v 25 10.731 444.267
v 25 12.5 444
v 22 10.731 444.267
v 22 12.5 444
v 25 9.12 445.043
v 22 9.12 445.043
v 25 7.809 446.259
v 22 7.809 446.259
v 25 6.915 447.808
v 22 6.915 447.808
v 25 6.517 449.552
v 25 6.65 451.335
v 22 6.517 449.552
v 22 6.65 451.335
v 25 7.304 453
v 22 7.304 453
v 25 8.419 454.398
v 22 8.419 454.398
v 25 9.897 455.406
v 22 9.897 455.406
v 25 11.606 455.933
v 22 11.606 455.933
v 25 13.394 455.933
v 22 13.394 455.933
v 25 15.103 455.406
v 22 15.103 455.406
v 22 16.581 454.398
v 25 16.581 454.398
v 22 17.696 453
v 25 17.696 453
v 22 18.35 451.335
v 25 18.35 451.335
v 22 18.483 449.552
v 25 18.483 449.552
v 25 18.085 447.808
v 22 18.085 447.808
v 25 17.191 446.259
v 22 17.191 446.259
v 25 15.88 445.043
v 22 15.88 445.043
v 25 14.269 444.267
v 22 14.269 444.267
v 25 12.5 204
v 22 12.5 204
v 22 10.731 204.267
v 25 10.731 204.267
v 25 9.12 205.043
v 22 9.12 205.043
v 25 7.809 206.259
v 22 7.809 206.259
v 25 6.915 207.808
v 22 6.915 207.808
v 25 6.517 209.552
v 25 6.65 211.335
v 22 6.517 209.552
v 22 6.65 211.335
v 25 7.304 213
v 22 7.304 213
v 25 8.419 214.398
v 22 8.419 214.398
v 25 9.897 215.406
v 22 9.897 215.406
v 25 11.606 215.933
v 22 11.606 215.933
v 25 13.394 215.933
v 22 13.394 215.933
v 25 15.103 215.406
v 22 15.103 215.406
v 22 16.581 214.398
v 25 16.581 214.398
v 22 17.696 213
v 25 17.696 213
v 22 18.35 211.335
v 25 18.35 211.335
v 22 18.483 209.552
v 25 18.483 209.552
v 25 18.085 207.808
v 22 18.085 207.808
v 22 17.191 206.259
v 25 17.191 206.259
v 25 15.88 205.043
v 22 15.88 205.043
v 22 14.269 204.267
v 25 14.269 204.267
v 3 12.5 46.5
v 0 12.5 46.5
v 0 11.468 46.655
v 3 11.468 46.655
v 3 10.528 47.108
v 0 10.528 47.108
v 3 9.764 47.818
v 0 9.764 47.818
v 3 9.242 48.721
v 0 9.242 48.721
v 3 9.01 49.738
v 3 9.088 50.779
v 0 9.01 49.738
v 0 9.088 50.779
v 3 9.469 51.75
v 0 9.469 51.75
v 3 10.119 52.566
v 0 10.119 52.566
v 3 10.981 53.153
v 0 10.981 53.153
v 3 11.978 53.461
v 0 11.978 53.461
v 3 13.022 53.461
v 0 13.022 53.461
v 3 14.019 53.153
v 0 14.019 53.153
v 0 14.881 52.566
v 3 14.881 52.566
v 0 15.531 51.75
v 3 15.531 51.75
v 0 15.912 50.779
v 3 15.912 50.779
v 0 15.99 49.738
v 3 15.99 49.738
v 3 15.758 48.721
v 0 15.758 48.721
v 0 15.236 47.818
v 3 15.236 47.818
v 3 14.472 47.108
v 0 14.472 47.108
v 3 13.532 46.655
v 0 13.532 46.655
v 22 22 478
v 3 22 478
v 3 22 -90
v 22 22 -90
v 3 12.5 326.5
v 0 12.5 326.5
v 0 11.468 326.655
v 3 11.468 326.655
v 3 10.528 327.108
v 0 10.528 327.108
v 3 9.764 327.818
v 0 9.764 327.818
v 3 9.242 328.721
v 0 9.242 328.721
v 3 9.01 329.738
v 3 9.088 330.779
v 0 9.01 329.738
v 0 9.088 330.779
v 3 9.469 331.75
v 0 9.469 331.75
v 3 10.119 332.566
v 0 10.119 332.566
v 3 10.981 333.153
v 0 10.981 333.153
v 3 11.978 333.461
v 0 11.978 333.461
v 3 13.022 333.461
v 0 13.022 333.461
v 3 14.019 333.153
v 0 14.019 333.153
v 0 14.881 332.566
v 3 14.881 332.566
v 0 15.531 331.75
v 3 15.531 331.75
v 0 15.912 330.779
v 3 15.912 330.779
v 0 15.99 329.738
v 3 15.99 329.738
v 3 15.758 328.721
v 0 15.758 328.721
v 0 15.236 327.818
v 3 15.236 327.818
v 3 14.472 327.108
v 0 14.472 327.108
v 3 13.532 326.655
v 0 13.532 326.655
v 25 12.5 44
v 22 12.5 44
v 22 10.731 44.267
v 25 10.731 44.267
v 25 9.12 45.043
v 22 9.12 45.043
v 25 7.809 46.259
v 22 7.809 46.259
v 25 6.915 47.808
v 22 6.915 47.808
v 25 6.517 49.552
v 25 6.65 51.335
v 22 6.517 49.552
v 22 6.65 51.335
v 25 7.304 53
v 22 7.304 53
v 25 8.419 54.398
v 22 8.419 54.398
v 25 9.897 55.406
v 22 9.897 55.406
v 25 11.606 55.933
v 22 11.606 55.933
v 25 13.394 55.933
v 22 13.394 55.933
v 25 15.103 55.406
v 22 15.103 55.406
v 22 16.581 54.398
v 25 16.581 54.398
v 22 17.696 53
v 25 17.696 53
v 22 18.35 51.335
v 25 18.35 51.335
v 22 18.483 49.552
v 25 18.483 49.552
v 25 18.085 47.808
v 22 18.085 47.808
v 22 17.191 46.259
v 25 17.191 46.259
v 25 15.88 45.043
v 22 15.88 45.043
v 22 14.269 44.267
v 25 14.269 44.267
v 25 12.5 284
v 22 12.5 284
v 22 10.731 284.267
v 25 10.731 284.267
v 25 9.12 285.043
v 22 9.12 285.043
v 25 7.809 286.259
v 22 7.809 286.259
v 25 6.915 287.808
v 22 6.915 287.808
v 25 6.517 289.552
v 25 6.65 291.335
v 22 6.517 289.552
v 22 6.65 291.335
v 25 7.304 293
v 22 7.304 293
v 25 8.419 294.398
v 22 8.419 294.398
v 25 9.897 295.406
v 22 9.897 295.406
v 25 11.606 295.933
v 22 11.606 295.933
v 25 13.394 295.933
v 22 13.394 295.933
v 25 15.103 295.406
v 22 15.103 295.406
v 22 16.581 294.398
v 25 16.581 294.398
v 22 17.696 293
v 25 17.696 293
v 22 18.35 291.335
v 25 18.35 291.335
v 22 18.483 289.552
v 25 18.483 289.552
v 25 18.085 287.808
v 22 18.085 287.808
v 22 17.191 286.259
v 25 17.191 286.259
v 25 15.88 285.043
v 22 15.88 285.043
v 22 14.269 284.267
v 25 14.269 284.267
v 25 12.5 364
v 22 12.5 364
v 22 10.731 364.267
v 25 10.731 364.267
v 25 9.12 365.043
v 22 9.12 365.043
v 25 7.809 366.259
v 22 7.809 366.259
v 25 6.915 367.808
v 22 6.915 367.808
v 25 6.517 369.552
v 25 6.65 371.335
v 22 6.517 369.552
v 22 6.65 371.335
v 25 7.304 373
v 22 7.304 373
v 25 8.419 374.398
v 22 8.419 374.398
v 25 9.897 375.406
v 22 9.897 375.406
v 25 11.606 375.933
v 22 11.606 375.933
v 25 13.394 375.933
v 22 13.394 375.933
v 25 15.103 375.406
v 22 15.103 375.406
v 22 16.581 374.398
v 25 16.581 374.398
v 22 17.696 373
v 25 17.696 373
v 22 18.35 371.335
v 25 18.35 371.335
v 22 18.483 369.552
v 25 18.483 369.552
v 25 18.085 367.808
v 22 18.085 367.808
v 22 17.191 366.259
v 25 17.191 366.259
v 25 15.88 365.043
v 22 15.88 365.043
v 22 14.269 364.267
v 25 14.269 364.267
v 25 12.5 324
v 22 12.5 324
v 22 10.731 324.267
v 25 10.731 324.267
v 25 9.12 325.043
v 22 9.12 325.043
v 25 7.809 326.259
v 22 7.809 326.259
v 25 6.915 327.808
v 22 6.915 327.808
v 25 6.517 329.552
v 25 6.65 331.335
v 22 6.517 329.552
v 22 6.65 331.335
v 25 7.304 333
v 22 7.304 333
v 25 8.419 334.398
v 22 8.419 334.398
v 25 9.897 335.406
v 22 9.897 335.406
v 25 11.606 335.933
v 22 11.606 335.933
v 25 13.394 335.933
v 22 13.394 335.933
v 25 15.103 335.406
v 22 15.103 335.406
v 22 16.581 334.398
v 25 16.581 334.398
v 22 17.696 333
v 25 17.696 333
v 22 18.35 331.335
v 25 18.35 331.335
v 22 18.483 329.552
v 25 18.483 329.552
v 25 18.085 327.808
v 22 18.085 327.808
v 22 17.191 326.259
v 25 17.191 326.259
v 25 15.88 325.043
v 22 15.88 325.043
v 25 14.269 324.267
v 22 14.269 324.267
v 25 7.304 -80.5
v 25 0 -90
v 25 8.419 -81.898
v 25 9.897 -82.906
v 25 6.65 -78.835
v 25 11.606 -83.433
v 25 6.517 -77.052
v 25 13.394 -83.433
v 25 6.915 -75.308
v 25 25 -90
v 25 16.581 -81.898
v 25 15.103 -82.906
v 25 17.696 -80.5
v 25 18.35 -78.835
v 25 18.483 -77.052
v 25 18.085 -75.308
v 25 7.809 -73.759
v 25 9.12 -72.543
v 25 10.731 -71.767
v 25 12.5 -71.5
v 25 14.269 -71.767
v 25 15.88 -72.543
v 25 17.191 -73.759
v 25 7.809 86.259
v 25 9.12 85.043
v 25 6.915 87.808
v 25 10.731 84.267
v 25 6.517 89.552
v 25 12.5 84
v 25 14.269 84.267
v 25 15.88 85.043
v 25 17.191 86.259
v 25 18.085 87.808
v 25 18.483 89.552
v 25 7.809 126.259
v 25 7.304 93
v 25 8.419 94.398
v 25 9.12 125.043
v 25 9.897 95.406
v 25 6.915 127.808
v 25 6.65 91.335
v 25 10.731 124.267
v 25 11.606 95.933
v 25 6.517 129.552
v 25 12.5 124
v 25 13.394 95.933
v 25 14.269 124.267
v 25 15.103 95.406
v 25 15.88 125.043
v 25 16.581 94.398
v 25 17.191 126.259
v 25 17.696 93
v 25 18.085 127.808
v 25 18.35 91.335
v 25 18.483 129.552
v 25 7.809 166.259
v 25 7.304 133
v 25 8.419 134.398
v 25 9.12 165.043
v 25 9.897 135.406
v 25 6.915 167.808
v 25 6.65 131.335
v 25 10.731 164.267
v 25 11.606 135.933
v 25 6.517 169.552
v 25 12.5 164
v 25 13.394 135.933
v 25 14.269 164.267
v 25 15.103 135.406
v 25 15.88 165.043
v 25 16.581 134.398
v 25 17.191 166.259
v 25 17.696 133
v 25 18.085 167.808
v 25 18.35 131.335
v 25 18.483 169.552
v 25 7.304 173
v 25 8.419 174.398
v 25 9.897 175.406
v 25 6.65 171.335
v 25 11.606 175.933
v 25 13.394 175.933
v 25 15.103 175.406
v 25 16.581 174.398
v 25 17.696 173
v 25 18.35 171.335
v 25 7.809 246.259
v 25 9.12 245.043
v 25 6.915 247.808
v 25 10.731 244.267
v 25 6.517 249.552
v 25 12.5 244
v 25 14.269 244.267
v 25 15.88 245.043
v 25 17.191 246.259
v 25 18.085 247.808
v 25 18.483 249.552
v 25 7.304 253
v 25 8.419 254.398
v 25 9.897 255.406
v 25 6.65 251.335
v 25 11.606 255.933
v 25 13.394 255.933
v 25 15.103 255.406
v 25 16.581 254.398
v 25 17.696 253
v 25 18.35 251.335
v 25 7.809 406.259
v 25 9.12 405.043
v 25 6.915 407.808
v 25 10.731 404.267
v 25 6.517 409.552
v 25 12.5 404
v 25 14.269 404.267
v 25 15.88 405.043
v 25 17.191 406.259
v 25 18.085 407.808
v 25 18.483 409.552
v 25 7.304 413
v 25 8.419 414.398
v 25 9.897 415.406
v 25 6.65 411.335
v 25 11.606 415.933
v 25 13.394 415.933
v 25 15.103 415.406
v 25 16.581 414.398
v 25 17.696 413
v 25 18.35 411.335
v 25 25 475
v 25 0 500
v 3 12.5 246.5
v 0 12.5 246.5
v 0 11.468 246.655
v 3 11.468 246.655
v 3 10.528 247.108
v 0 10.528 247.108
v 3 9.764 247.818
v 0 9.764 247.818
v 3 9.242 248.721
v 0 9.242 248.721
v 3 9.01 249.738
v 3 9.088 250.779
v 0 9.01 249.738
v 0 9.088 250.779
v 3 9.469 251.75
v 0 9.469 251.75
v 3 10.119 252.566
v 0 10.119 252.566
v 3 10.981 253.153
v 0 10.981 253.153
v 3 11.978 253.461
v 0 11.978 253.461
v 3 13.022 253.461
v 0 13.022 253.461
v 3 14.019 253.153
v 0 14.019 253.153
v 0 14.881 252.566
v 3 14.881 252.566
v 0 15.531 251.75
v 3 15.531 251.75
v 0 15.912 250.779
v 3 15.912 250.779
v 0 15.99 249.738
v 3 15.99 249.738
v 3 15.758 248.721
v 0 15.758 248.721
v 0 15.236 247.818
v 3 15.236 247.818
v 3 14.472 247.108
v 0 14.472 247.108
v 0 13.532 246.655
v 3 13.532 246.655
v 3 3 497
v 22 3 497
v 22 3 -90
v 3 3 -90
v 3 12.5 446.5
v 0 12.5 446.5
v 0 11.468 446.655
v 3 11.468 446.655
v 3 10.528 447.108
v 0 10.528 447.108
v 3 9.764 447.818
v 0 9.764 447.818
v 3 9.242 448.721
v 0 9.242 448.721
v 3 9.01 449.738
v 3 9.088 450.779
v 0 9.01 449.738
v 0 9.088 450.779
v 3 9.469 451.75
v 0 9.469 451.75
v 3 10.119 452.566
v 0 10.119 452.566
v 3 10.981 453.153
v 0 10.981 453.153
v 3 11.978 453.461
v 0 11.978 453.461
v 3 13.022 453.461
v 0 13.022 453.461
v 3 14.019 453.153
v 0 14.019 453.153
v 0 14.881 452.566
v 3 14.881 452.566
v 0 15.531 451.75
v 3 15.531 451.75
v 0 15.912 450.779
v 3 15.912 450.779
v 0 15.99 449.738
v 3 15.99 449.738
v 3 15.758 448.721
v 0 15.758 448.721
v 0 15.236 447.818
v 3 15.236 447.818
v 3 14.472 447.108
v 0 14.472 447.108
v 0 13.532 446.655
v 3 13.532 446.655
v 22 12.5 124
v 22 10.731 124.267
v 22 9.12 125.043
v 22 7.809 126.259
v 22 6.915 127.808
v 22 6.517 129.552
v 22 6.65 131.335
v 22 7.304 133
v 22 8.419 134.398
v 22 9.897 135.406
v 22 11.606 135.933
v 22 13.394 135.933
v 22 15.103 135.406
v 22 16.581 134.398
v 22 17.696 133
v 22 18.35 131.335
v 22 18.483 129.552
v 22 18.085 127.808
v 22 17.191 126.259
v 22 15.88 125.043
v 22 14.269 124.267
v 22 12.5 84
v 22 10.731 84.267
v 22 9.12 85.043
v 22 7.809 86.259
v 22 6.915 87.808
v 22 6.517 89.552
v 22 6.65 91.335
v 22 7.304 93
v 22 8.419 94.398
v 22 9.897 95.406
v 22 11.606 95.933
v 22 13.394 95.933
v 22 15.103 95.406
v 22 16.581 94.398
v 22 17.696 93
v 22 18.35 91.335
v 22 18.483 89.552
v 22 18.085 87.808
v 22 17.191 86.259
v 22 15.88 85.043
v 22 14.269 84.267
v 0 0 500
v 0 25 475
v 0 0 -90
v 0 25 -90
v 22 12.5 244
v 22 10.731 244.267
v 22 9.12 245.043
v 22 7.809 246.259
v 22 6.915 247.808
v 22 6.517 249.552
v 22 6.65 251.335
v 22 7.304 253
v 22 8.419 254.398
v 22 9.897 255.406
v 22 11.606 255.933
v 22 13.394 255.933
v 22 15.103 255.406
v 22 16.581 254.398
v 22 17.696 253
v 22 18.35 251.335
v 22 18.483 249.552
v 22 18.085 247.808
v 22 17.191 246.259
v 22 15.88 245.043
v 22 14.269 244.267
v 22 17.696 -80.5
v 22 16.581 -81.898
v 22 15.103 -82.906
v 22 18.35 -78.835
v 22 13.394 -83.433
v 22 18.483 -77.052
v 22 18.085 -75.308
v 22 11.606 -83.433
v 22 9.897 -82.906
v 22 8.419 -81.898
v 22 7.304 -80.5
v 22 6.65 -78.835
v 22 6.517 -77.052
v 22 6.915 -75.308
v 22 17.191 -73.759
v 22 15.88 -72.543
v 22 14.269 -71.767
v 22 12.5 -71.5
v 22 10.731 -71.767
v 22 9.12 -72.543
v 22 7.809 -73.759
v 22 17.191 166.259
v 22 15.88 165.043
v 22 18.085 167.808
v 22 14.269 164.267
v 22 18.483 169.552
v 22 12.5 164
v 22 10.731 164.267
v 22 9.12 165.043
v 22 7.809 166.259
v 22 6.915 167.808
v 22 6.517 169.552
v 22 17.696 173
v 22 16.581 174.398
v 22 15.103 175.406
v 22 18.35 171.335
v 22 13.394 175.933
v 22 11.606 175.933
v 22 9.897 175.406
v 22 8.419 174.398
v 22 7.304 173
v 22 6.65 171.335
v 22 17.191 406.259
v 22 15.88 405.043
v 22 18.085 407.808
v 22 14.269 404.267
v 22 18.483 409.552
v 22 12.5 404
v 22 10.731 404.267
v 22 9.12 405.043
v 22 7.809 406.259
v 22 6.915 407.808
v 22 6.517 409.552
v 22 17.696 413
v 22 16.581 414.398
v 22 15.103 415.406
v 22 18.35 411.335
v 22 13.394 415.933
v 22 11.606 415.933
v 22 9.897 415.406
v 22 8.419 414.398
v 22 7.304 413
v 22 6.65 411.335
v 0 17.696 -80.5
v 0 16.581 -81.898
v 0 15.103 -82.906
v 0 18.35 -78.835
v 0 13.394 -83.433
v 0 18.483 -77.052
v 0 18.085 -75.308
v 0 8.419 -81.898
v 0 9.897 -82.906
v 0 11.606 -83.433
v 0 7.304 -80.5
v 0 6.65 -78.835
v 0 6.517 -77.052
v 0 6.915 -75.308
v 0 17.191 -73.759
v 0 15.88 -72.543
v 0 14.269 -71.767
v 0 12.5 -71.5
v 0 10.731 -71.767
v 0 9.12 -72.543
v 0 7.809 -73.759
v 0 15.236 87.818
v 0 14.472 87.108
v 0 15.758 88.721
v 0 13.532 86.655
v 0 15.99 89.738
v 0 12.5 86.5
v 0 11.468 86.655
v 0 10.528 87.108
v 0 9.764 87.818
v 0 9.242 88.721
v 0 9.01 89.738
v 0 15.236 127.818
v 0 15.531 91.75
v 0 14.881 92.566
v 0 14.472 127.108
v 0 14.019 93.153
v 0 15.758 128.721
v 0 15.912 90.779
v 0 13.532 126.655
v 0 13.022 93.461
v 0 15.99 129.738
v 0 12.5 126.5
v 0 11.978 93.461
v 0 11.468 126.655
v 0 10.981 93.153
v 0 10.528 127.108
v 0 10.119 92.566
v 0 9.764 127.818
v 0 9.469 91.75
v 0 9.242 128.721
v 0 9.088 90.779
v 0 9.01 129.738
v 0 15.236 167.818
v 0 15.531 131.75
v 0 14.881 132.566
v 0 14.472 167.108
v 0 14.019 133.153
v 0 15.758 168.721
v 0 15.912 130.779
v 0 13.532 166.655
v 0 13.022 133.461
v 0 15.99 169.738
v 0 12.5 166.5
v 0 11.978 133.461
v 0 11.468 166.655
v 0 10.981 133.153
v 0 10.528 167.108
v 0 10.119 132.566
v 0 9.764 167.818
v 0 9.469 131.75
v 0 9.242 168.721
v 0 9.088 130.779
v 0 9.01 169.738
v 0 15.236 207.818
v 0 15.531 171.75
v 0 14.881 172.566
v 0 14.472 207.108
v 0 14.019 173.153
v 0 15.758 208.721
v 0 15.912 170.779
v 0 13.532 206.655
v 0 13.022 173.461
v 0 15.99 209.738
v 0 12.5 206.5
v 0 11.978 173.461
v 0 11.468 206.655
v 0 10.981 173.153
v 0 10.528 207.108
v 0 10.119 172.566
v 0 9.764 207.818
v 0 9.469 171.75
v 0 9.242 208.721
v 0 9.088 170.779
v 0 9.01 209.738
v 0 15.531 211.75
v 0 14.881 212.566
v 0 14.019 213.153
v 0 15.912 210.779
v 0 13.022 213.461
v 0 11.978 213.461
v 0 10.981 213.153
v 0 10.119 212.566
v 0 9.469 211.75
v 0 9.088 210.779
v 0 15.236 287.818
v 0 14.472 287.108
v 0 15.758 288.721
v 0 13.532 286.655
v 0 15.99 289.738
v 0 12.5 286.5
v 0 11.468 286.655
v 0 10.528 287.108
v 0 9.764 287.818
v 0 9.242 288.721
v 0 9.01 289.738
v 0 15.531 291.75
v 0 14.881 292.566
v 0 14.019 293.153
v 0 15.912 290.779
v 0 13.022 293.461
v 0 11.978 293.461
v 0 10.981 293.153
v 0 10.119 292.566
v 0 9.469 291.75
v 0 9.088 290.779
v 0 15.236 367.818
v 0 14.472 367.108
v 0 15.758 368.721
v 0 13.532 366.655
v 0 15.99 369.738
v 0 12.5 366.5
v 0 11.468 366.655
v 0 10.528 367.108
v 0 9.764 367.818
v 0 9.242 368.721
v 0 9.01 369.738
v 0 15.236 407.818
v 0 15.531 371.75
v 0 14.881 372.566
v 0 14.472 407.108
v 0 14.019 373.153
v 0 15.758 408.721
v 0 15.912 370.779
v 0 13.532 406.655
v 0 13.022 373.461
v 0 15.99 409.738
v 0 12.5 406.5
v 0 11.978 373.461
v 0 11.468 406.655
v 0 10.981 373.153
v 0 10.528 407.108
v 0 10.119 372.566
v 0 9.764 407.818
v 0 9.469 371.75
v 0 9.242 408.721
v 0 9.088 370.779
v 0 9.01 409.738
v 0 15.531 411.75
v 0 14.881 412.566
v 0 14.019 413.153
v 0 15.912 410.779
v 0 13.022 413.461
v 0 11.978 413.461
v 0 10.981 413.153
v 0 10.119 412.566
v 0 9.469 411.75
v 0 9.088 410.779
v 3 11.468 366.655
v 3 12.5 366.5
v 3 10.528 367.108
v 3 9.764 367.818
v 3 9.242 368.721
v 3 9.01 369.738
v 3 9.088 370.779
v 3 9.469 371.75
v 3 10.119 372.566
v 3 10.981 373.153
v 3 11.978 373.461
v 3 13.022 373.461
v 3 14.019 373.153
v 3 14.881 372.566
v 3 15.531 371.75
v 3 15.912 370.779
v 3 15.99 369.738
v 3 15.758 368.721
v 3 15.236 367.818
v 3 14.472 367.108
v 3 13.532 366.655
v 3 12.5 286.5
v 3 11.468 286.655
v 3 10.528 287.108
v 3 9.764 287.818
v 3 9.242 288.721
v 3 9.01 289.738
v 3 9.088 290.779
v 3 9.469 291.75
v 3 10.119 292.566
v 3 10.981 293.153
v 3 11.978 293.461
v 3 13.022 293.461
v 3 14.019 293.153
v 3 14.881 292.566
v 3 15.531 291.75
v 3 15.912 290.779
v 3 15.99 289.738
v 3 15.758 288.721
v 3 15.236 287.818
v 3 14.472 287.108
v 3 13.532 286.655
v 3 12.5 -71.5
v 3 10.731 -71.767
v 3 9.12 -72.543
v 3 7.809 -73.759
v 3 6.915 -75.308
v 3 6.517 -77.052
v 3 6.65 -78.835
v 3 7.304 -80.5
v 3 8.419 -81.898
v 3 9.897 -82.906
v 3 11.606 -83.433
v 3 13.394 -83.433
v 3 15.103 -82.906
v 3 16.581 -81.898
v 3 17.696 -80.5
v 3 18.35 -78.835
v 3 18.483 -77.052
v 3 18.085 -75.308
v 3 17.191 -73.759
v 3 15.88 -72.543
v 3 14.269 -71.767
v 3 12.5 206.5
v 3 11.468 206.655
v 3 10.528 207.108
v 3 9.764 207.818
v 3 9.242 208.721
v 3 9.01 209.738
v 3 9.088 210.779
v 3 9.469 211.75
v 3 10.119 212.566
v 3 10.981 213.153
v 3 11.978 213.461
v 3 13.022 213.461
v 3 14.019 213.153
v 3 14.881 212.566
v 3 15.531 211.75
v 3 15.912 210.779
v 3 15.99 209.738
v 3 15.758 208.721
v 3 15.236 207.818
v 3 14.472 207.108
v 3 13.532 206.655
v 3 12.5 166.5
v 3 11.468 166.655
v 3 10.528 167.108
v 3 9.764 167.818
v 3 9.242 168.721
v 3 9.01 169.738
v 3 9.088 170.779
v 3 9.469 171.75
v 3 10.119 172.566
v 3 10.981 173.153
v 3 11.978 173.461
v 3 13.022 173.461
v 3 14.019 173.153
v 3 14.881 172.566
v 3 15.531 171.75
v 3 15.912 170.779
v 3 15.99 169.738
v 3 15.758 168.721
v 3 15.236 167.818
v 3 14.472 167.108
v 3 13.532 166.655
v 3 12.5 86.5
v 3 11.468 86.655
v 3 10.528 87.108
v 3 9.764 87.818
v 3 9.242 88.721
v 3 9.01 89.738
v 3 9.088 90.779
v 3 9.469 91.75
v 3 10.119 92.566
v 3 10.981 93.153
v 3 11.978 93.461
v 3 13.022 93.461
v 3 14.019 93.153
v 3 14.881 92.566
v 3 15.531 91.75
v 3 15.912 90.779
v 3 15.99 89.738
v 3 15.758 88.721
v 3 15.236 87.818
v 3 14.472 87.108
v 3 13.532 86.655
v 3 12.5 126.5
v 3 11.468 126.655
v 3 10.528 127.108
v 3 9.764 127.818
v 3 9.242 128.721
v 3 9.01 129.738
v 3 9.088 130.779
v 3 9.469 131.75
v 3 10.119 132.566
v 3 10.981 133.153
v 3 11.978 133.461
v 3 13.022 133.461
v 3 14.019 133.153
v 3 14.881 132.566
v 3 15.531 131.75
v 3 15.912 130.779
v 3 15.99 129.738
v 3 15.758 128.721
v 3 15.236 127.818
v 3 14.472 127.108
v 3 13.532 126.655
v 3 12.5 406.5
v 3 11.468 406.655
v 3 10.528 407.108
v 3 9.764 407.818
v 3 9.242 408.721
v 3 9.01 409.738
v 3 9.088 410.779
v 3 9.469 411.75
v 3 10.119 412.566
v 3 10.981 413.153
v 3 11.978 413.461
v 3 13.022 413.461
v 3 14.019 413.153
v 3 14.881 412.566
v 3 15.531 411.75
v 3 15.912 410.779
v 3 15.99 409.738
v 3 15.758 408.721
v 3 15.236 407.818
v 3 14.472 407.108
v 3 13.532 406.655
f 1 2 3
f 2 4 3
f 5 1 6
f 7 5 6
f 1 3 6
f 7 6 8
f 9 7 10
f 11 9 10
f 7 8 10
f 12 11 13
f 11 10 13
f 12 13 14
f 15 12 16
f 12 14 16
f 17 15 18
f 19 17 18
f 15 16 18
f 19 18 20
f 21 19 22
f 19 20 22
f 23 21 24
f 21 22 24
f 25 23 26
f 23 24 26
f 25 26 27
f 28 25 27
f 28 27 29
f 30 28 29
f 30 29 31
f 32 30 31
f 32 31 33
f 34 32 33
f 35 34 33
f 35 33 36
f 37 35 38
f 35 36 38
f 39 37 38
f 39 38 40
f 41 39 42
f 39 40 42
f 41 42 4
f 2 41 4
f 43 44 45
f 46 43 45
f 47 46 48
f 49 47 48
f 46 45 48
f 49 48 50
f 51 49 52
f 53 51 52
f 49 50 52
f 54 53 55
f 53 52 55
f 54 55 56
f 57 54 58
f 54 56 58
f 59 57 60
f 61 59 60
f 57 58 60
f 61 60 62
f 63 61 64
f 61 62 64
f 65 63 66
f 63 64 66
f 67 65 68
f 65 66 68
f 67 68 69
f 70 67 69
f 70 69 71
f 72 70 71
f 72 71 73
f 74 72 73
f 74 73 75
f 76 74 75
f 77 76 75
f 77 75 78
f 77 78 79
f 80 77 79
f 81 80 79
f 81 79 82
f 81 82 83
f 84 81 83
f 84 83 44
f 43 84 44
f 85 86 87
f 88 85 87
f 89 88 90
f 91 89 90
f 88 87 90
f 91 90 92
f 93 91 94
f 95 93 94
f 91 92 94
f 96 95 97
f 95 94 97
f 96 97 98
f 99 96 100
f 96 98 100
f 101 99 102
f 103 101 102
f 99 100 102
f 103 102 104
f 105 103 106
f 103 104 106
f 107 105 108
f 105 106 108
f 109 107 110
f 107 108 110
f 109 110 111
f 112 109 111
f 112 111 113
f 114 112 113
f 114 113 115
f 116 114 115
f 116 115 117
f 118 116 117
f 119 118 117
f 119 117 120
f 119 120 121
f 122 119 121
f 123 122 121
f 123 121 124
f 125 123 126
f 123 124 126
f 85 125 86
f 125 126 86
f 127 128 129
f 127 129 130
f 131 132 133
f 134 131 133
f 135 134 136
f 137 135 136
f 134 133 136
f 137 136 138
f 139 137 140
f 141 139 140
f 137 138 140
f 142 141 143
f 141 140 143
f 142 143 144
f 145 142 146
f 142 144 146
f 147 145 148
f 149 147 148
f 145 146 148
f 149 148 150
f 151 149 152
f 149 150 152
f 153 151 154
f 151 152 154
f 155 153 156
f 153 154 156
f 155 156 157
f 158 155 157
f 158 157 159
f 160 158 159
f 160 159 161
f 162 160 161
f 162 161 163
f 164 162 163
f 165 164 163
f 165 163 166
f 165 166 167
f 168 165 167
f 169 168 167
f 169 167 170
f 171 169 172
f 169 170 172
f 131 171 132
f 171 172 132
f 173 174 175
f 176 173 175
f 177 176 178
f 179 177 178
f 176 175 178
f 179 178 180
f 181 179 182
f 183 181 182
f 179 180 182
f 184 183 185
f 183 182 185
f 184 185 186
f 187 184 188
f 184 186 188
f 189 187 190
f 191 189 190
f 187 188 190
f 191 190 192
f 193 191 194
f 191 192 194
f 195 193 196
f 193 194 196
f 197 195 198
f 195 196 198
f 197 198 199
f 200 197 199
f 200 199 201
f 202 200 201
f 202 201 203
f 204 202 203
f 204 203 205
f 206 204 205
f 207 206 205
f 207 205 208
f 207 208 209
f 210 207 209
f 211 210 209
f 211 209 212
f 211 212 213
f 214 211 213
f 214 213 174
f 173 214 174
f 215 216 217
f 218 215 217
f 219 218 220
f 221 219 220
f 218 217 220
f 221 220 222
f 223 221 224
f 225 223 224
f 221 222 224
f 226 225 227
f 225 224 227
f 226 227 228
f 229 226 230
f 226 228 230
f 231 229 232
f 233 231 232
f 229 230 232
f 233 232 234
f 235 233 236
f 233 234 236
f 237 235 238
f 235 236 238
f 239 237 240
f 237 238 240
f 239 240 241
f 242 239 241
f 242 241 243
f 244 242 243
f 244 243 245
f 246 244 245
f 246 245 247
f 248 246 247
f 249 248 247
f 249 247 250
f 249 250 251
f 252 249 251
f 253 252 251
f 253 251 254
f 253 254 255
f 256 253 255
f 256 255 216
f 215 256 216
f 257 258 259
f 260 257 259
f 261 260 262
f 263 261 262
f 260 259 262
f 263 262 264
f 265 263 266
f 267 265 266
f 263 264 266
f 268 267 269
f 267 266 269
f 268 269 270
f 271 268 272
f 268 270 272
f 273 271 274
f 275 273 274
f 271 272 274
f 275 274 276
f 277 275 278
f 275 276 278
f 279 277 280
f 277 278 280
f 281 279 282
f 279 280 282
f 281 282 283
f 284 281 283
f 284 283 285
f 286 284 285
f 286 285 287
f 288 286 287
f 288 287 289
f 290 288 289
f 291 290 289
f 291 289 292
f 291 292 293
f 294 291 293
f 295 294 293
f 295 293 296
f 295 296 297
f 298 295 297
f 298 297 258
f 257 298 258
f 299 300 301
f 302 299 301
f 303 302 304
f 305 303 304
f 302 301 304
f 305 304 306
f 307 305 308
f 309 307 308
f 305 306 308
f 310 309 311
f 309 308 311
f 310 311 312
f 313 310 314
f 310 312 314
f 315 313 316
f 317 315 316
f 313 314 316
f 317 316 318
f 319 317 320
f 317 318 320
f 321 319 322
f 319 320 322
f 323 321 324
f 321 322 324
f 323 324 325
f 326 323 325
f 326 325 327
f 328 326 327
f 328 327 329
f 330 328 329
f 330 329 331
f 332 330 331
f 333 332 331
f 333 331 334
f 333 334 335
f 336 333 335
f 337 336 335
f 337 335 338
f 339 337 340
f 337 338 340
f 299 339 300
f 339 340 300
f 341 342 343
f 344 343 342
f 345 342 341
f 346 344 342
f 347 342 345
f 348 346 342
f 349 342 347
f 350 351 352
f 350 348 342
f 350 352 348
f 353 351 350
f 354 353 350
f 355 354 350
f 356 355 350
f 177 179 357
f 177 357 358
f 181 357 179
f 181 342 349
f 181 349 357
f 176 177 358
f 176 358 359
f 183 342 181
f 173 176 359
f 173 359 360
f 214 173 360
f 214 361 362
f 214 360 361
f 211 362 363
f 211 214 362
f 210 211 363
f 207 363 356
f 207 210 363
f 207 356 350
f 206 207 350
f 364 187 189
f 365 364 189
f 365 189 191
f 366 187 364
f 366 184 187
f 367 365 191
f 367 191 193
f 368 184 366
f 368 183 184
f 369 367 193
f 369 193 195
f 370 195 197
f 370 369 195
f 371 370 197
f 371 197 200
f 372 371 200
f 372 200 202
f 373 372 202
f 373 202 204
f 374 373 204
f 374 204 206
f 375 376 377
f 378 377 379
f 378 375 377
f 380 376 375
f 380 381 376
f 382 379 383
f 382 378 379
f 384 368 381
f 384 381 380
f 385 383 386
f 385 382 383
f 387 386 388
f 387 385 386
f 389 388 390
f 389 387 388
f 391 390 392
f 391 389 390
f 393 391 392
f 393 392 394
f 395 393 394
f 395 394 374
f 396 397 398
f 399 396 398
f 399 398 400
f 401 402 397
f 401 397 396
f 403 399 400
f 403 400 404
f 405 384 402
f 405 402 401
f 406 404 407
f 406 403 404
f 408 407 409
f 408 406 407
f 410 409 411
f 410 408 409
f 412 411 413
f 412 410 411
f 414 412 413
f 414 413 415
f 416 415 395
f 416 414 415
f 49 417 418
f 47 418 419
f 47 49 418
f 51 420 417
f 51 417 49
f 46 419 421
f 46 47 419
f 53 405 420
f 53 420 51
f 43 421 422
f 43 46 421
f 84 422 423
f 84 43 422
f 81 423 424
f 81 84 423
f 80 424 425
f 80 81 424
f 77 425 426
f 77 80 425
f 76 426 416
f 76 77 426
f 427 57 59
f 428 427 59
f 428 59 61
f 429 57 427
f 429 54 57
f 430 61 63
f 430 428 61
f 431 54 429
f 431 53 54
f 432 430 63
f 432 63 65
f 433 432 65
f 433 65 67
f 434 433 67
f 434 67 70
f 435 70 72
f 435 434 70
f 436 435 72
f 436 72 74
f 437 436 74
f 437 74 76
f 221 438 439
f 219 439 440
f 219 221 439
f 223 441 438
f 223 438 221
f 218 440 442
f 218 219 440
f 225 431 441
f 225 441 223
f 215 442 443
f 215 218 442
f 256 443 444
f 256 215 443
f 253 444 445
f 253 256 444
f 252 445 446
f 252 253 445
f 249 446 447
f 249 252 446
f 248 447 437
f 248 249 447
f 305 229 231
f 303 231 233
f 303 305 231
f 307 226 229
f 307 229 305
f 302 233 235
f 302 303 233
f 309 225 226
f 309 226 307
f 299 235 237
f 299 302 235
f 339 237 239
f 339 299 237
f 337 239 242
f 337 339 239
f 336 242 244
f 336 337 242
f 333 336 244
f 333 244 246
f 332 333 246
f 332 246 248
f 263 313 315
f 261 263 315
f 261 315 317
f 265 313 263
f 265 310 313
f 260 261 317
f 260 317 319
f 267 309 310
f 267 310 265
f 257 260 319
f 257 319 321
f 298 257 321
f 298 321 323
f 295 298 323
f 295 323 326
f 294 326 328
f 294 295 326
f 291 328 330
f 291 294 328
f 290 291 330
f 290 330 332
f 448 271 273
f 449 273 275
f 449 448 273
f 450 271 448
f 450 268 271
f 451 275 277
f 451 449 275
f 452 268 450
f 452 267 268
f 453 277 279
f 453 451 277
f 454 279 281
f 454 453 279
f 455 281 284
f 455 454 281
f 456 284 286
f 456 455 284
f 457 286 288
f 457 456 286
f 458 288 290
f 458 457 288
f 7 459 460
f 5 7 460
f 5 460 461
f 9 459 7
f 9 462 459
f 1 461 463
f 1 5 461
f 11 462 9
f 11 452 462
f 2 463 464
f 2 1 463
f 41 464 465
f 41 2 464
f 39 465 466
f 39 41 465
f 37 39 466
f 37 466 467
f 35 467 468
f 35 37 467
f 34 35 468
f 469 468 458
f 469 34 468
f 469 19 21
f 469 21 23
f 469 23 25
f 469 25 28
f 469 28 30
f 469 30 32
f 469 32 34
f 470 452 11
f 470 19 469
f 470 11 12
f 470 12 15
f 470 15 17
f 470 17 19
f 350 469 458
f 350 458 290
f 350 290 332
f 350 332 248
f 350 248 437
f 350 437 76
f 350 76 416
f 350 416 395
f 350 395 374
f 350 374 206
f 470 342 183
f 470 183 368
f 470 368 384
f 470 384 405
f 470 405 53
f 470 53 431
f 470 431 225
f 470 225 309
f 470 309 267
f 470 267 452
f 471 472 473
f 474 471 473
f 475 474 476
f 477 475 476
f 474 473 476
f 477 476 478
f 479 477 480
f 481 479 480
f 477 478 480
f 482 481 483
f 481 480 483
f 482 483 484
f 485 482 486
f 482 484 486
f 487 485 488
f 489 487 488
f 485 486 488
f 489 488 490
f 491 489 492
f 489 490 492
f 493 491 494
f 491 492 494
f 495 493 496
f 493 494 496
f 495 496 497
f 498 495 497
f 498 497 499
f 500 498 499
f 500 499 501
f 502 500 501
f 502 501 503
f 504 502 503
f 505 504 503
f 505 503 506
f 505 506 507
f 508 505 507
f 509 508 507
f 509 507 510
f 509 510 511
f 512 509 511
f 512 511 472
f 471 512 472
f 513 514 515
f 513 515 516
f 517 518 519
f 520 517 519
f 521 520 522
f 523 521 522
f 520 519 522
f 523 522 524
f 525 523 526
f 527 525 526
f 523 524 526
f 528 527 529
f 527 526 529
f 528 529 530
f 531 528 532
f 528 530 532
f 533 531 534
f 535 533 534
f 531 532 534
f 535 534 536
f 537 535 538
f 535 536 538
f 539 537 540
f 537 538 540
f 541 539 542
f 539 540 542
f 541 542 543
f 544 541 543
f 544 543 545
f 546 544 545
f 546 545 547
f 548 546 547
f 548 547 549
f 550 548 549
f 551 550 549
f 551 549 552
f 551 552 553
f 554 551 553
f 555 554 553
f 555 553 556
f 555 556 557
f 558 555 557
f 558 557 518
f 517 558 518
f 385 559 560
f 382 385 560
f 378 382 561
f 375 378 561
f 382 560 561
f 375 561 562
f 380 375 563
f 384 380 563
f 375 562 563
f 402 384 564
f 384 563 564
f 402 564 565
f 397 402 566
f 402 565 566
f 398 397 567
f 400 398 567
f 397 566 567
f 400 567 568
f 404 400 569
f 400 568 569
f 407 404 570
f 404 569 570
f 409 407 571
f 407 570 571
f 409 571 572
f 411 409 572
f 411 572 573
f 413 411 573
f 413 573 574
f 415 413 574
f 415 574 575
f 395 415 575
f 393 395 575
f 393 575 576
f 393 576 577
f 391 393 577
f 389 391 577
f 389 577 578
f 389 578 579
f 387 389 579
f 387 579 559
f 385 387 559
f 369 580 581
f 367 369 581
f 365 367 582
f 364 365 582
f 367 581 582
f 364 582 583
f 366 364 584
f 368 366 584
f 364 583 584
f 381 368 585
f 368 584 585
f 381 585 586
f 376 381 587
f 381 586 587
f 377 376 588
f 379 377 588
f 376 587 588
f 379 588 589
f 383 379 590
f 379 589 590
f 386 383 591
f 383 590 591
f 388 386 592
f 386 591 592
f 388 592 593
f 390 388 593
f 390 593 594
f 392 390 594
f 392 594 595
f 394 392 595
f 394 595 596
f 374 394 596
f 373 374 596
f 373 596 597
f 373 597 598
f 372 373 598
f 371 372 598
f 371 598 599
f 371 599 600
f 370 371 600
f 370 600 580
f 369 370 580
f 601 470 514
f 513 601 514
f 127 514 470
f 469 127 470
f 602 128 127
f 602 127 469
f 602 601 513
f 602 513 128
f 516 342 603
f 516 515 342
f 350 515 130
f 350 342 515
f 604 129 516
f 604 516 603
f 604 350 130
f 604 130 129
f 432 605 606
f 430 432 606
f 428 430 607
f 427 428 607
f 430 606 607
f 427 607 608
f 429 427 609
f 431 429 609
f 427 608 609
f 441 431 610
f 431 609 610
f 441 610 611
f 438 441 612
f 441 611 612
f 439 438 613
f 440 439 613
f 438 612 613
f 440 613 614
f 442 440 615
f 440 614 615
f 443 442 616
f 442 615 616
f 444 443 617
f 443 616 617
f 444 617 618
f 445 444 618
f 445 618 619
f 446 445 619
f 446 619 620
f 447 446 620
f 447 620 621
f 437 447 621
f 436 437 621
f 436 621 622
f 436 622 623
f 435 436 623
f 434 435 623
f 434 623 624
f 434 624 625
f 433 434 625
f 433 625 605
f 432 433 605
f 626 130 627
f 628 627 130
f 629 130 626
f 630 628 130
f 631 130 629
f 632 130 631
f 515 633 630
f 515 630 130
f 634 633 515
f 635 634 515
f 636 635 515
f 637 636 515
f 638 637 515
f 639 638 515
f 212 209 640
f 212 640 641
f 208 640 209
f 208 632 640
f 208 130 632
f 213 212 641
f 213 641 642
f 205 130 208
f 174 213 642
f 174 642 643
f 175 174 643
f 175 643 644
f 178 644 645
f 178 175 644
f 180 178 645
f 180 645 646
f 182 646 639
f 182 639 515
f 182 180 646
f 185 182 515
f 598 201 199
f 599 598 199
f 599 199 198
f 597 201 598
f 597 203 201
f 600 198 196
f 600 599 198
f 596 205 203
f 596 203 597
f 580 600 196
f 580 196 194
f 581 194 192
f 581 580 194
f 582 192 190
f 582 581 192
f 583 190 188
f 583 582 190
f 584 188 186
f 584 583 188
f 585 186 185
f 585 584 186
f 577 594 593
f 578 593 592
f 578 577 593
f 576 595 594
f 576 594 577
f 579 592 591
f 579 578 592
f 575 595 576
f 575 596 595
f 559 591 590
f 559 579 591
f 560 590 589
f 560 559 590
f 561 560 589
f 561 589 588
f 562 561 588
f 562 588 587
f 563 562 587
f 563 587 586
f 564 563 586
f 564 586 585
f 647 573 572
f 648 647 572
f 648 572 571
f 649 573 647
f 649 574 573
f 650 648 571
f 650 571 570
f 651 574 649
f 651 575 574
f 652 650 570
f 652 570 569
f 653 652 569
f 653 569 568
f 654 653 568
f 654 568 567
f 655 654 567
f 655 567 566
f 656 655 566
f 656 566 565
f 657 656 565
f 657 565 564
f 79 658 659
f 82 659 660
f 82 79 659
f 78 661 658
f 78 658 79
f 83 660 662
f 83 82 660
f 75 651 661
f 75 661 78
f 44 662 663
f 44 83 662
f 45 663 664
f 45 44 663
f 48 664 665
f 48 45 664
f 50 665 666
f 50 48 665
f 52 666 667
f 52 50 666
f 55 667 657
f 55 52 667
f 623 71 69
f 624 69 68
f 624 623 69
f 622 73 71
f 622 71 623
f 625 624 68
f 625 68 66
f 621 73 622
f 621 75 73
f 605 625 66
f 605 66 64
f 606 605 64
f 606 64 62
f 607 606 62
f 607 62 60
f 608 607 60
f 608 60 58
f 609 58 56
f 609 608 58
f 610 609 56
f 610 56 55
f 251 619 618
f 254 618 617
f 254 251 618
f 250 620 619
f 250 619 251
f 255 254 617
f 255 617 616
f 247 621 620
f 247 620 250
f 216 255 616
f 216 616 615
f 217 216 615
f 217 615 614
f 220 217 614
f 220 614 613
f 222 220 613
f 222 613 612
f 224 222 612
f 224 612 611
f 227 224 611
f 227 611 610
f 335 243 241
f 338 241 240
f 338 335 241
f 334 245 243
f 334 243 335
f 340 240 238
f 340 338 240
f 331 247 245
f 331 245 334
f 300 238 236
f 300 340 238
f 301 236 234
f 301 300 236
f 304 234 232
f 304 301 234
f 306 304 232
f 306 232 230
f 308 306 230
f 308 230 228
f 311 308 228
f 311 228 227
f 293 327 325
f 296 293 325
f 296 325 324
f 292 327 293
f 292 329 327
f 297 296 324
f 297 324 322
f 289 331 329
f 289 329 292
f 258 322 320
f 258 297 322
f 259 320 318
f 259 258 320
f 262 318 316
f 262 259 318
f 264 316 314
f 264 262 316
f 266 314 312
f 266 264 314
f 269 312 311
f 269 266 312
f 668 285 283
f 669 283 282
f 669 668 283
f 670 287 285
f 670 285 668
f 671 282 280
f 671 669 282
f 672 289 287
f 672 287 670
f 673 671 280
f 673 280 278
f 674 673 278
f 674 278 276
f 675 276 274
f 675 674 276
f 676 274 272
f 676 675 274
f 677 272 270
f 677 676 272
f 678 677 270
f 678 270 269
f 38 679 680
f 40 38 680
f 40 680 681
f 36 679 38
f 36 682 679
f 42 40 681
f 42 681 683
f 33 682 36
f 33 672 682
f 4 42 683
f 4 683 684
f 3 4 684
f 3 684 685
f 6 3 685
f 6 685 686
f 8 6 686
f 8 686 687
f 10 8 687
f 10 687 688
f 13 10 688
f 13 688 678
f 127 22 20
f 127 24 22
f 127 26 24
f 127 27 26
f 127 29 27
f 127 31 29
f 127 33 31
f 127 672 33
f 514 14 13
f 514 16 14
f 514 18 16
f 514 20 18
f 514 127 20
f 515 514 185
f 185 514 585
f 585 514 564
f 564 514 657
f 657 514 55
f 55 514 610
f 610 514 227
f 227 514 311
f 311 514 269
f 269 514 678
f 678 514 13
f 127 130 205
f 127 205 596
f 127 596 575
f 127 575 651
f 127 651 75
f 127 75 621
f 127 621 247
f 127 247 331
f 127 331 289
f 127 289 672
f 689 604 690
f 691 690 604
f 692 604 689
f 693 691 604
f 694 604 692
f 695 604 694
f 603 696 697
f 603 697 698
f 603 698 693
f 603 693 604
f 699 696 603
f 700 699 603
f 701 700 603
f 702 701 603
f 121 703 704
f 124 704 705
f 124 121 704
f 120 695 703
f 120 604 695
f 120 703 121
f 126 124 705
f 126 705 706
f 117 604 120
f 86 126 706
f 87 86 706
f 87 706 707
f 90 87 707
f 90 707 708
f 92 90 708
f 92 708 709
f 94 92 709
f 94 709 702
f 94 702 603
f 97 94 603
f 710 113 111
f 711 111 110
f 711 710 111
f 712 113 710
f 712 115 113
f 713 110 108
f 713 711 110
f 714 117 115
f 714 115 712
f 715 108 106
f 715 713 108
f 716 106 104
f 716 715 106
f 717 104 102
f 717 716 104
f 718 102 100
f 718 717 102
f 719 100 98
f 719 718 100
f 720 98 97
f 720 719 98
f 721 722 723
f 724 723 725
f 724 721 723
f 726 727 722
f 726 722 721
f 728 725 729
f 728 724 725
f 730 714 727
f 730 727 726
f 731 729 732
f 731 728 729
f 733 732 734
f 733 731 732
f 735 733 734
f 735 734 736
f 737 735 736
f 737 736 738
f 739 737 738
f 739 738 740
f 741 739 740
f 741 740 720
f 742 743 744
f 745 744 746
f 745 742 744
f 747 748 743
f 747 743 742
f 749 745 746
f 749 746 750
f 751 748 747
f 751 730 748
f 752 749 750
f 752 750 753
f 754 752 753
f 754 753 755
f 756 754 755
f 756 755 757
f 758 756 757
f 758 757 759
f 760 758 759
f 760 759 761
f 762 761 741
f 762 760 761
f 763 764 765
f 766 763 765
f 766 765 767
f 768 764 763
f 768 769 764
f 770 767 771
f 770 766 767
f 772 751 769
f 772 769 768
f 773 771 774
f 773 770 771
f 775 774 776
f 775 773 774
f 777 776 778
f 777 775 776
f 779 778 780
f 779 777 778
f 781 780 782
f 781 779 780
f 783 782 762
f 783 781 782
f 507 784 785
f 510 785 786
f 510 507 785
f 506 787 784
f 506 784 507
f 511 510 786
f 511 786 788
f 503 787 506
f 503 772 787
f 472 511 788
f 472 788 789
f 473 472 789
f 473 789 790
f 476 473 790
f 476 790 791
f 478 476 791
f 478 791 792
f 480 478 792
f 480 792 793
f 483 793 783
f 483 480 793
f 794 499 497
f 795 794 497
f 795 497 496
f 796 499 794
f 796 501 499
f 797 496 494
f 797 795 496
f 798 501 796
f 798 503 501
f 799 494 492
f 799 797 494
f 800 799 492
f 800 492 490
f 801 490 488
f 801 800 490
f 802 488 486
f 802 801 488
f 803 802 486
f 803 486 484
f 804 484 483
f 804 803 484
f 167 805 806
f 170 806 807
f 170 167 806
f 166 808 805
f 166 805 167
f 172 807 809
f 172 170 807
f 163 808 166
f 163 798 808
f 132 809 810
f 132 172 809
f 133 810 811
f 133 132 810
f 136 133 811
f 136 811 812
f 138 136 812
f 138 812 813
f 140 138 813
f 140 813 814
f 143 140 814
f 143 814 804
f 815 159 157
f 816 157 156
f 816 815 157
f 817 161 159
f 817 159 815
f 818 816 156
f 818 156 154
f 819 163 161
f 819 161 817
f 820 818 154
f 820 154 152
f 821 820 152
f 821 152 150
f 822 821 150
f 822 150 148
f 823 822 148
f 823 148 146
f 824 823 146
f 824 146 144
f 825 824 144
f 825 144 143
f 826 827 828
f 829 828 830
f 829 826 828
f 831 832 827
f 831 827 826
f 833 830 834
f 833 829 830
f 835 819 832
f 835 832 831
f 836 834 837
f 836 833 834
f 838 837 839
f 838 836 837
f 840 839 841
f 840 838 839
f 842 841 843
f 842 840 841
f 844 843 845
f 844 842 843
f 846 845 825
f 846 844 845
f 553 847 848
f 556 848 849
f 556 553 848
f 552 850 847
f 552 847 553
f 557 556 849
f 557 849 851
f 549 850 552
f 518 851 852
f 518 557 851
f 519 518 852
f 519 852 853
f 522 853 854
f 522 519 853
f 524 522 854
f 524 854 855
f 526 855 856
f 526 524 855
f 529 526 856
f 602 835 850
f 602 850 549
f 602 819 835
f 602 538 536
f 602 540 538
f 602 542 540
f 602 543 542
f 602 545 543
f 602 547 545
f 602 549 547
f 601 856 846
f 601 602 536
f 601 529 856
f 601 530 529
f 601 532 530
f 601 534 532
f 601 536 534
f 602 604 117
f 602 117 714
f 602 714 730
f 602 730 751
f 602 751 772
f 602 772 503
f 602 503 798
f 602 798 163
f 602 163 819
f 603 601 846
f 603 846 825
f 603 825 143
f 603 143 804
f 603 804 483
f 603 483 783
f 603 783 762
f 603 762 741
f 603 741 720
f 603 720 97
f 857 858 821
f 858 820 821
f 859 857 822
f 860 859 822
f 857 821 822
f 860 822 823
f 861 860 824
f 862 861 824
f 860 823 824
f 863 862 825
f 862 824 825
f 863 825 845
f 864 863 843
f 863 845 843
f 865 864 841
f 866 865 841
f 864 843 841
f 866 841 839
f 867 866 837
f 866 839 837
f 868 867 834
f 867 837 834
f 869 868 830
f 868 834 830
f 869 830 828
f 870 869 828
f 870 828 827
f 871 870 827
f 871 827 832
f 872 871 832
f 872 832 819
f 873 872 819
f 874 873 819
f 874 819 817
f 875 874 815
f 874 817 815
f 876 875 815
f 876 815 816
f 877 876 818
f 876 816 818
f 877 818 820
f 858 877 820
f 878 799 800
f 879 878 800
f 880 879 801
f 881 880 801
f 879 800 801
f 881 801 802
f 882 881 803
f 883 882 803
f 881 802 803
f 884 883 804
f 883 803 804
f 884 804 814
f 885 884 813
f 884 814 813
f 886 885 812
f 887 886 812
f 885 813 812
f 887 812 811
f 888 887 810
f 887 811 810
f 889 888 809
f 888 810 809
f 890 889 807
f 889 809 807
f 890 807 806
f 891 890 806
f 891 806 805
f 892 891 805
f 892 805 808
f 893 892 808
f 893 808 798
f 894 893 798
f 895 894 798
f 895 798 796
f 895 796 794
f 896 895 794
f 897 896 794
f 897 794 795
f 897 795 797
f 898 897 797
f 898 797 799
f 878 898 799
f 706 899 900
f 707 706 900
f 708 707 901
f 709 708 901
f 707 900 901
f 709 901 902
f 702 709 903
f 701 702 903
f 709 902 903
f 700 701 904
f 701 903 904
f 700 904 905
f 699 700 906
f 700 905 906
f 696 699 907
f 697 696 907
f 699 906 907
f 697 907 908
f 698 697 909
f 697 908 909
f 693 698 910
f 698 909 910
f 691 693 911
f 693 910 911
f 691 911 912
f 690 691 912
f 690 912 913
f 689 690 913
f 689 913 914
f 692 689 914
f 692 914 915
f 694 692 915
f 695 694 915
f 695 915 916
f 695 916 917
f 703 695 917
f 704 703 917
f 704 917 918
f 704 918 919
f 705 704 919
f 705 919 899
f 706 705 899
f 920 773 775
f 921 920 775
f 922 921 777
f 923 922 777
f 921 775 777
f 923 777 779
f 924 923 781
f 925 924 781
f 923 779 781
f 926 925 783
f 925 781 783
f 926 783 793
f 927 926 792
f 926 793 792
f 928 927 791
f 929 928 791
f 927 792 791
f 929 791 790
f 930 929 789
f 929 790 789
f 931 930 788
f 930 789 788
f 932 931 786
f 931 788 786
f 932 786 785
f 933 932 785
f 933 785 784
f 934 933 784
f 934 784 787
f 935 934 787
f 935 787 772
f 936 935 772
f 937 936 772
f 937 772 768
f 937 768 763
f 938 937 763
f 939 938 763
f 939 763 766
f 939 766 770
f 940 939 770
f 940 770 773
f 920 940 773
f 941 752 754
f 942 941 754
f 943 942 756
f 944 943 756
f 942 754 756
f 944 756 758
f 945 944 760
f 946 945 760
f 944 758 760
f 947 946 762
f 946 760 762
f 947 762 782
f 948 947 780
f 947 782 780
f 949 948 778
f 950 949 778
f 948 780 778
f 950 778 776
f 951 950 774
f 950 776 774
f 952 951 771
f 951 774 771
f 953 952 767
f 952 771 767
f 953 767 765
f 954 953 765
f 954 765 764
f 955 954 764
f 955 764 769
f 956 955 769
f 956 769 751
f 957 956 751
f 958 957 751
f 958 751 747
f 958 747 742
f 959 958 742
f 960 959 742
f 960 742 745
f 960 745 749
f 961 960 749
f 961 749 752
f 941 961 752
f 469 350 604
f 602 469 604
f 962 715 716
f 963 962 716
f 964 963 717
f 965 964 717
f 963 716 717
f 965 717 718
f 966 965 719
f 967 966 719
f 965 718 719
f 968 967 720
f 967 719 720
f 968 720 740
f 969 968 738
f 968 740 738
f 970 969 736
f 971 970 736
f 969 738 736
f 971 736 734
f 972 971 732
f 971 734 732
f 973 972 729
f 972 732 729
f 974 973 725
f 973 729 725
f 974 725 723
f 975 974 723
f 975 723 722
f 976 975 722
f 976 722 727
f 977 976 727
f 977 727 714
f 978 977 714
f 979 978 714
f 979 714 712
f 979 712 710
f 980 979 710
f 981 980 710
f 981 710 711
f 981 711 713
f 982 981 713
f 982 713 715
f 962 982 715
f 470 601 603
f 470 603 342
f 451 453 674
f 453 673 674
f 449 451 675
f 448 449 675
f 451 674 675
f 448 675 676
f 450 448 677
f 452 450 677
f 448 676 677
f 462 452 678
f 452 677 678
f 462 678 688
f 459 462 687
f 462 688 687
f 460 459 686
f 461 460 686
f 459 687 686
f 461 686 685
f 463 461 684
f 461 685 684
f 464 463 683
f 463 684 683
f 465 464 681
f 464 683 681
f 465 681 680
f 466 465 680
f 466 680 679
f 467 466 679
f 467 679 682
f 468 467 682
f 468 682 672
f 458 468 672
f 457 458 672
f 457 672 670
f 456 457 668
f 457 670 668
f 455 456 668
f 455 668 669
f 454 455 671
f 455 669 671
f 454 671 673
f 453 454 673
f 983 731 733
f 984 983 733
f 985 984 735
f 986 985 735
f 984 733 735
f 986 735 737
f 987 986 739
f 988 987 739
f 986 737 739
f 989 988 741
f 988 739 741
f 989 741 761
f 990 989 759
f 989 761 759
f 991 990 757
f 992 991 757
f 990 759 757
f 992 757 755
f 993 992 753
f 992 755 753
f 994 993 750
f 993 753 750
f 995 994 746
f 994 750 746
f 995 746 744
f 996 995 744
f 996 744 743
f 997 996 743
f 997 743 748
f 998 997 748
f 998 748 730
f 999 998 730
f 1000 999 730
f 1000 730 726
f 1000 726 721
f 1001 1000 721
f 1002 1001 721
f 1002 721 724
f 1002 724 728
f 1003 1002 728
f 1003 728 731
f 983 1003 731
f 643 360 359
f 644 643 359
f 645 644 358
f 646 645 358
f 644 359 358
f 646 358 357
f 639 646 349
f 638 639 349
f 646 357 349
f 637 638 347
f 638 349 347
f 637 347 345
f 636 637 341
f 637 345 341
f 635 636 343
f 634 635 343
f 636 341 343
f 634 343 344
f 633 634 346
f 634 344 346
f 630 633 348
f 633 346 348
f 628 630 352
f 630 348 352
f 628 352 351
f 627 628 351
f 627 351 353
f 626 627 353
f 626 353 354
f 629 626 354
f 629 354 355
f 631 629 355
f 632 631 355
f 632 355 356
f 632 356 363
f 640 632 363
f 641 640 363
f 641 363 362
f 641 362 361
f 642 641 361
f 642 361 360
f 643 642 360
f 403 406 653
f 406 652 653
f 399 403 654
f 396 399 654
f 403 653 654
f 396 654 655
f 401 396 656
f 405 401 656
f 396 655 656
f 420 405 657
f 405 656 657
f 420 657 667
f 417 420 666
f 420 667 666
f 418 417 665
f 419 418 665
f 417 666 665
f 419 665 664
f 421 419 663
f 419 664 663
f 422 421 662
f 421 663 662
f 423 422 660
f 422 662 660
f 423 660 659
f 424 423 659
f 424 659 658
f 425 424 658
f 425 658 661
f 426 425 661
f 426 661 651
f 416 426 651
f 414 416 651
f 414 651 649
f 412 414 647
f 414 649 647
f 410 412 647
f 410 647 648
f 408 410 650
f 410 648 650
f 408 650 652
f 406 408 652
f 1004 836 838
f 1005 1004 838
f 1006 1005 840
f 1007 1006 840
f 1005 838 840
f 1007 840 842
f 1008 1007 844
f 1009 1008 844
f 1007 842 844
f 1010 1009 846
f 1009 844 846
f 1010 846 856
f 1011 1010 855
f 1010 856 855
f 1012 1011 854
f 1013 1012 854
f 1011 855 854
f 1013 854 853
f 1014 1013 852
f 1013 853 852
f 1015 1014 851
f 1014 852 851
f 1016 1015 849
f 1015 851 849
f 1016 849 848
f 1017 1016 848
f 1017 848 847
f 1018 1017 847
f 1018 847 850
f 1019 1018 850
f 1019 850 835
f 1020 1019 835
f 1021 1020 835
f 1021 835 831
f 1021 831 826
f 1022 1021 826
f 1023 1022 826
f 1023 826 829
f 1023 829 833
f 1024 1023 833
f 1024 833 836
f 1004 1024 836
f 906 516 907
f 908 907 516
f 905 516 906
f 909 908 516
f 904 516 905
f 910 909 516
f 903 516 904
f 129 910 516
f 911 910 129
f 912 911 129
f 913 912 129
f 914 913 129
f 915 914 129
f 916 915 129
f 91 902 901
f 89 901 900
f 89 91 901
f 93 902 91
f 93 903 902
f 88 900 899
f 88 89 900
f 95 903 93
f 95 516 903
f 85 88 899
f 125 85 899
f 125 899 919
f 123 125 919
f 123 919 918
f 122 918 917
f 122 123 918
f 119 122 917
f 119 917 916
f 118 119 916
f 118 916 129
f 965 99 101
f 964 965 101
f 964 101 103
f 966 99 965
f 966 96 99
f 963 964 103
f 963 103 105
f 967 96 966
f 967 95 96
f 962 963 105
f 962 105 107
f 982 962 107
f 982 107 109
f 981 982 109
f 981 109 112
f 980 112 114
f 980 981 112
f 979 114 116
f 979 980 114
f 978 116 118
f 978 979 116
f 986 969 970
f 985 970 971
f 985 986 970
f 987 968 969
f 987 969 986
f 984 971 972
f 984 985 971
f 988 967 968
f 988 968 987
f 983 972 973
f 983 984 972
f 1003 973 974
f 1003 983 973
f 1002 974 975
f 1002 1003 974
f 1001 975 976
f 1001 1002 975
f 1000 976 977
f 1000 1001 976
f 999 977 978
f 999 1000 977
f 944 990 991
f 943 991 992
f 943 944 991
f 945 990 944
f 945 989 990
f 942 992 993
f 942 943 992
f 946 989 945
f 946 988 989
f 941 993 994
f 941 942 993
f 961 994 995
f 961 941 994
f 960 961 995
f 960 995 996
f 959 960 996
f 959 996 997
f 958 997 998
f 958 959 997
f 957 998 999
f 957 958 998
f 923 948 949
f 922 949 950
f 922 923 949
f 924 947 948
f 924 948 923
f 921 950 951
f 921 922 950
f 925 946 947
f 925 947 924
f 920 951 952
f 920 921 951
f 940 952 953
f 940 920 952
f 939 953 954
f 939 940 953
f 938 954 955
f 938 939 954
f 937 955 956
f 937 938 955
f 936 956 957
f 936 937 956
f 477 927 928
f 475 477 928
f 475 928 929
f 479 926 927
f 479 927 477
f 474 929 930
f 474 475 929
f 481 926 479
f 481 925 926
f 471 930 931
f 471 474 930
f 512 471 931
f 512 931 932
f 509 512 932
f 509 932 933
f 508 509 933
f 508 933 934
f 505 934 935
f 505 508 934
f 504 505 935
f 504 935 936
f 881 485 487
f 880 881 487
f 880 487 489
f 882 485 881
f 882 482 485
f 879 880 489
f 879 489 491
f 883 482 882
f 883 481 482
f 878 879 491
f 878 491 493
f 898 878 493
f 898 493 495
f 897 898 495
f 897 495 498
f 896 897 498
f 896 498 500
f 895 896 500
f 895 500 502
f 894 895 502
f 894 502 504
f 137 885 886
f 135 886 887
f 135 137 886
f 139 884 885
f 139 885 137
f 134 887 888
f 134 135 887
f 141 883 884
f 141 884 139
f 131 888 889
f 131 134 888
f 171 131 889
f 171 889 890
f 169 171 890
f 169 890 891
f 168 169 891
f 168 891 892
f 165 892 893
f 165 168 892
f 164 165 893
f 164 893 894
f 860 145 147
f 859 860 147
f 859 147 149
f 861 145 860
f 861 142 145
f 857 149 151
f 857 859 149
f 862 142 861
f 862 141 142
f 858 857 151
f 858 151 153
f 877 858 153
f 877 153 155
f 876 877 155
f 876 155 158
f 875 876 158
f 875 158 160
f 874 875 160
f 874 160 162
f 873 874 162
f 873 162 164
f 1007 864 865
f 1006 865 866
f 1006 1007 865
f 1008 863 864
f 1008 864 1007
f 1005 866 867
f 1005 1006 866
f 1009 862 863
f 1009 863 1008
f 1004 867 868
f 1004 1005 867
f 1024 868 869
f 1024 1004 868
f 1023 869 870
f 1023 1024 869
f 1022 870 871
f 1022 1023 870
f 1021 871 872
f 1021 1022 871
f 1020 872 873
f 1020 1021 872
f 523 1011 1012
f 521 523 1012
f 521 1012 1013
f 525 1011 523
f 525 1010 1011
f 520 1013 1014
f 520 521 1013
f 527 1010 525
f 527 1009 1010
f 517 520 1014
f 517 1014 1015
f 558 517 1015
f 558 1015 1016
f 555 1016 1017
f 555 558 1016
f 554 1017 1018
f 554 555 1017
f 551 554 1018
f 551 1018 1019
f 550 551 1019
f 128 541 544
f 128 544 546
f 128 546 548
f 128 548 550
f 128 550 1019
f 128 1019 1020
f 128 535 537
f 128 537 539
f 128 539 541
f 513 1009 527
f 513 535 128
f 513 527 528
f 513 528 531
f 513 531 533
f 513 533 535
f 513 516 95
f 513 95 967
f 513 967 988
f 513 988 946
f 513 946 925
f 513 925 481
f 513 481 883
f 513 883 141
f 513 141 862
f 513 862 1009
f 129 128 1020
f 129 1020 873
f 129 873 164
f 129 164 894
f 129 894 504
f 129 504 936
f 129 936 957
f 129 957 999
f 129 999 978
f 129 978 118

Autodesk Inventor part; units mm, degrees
ref_plane "YZ Plane" through (0, 0, 0) normal (1, 0, 0) x (0, 1, 0)
ref_plane "XZ Plane" through (0, 0, 0) normal (0, 1, 0) x (-1, 0, 0)
ref_plane "XY Plane" through (0, 0, 0) normal (0, 0, 1) x (1, 0, 0)
sketch "Sketch1" plane through (0, 0, 0) normal (0, 0, 1) x (1, 0, 0)
  line L0 (0, 0) -> (25, 0)
  line L1 (25, 0) -> (25, 25)
  line L2 (25, 25) -> (0, 25)
  line L3 (0, 25) -> (0, 0)
  line L4 (3, 3) -> (22, 3)
  line L5 (22, 3) -> (22, 22)
  line L6 (22, 22) -> (3, 22)
  line L7 (3, 22) -> (3, 3)
  dimension "d0" = 25
  dimension "d1" = 25
  dimension "d2" = 3
extrude "Extrusion1" add sketch "Sketch1" along normal blind 500
sketch "Sketch3" plane through (25, 0, 0) normal (1, 0, 0) x (0, 0, -1)
  line L0 (0, 0) -> (0, 25) projected
  line L1 (0, 25) -> (-500, 25) projected
  line L2 (-500, 0) -> (-500, 25) projected
  line L3 (0, 0) -> (-500, 0) projected
  point P0 (0, 0)
  point P1 (-450, 12.5)
  point P2 (-50, 12.5)
  point P3 (-410, 12.5)
  point P4 (-370, 12.5)
  point P5 (-330, 12.5)
  point P6 (-290, 12.5)
  point P7 (-250, 12.5)
  point P8 (-210, 12.5)
  point P9 (-170, 12.5)
  point P10 (-130, 12.5)
  point P11 (-90, 12.5)
  dimension "d16" = 12.5
  dimension "d17" = 50
  dimension "d18" = 50
  dimension "d19" = 12.5
  dimension "d22" = 40
hole "Hole2" at (25, 12.5, 450) at (25, 12.5, 50) at (25, 12.5, 410) at (25, 12.5, 370) at (25, 12.5, 330) at (25, 12.5, 290) at (25, 12.5, 250) at (25, 12.5, 210) at (25, 12.5, 170) at (25, 12.5, 130) at (25, 12.5, 90) direction (-1, 0, 0) diameter 12 depth 8 tip angle 118
sketch "Sketch4" plane through (3, 3, 0) normal (1, 0, 0) x (0, 0, -1)
  circle A0 centre (-130, 9.5) radius 6 projected
  circle A1 centre (-210, 9.5) radius 6 projected
  circle A2 centre (-290, 9.5) radius 6 projected
  circle A3 centre (-370, 9.5) radius 6 projected
  circle A4 centre (-50, 9.5) radius 6 projected
  circle A5 centre (-450, 9.5) radius 6 projected
  circle A6 centre (-410, 9.5) radius 6 projected
  circle A7 centre (-330, 9.5) radius 6 projected
  circle A8 centre (-250, 9.5) radius 6 projected
  circle A9 centre (-170, 9.5) radius 6 projected
  circle A10 centre (-90, 9.5) radius 6 projected
  line L0 (0, -3) -> (0, 22) projected
  line L1 (0, 22) -> (-500, 22) projected
  line L2 (-500, -3) -> (-500, 22) projected
  line L3 (0, -3) -> (-500, -3) projected
  arc A11 (0, -3) -> (0, -3) centre (-50, 9.5) ccw projected
  circle A12 centre (-210, 9.5) radius 6 projected
  circle A13 centre (-250, 9.5) radius 6 projected
  circle A14 centre (-370, 9.5) radius 6 projected
  circle A15 centre (-410, 9.5) radius 6 projected
hole "Hole3" at (3, 12.5, 50) at (3, 12.5, 90) at (3, 12.5, 130) at (3, 12.5, 170) at (3, 12.5, 210) at (3, 12.5, 250) at (3, 12.5, 290) at (3, 12.5, 330) at (3, 12.5, 370) at (3, 12.5, 410) at (3, 12.5, 450) direction (-1, 0, 0) diameter 7 depth 8 tip angle 118
sketch "Sketch6" plane through (0, 0, 0) normal (0, 0, -1) x (-1, 0, 0)
  line L0 (-25, 0) -> (-25, 25) projected
  line L1 (0, 0) -> (-25, 0) projected
  line L2 (0, 25) -> (0, 0) projected
  line L3 (-25, 25) -> (0, 25) projected
  line L4 (-3, 3) -> (-3, 22) projected
  line L5 (-22, 3) -> (-3, 3) projected
  line L6 (-22, 22) -> (-22, 3) projected
  line L7 (-3, 22) -> (-22, 22) projected
extrude "Extrusion3" add sketch "Sketch6" along normal blind 90
sketch "Sketch7" plane through (0, 0, 500) normal (-1, 0, 0) x (0, 0, 1)
  circle A0 centre (-90, 12.5) radius 3.5 projected
  circle A1 centre (-170, 12.5) radius 3.5 projected
  circle A2 centre (-250, 12.5) radius 3.5 projected
  circle A3 centre (-330, 12.5) radius 3.5 projected
  circle A4 centre (-410, 12.5) radius 3.5 projected
  circle A5 centre (-450, 12.5) radius 3.5 projected
  circle A6 centre (-370, 12.5) radius 3.5 projected
  circle A7 centre (-290, 12.5) radius 3.5 projected
  circle A8 centre (-210, 12.5) radius 3.5 projected
  circle A9 centre (-130, 12.5) radius 3.5 projected
  circle A10 centre (-50, 12.5) radius 3.5 projected
  line L0 (-590, 0) -> (0, 0) projected
  line L1 (0, 25) -> (0, 0) projected
  line L2 (-590, 25) -> (0, 25) projected
  line L3 (-590, 0) -> (-590, 25) projected
  point P0 (-500, 0)
  point P1 (-577.5, 12.5)
  dimension "d47" = 12.5
  dimension "d48" = 12.5
hole "Hole4" at (0, 12.5, -77.5) direction (1, 0, 0) diameter 12 end through all
sketch "Sketch8" plane through (25, 0, 500) normal (1, 0, 0) x (0, 0, -1)
  point P0 (500, 0)
sketch "Sketch9" plane through (0, 0, 500) normal (-1, 0, 0) x (0, 0, 1)
  circle A0 centre (-577.5, 12.5) radius 6 projected
  circle A1 centre (-90, 12.5) radius 3.5 projected
  circle A2 centre (-170, 12.5) radius 3.5 projected
  circle A3 centre (-250, 12.5) radius 3.5 projected
  circle A4 centre (-330, 12.5) radius 3.5 projected
  circle A5 centre (-410, 12.5) radius 3.5 projected
  circle A6 centre (-450, 12.5) radius 3.5 projected
  circle A7 centre (-370, 12.5) radius 3.5 projected
  circle A8 centre (-290, 12.5) radius 3.5 projected
  circle A9 centre (-210, 12.5) radius 3.5 projected
  circle A10 centre (-130, 12.5) radius 3.5 projected
  circle A11 centre (-50, 12.5) radius 3.5 projected
  line L0 (-590, 0) -> (0, 0) projected
  line L1 (0, 25) -> (0, 0) projected
  line L2 (-590, 25) -> (0, 25) projected
  line L3 (-590, 0) -> (-590, 25) projected
  line L4 (0, 0) -> (0, 25) projected
  line L5 (0, 0) -> (-25, 25)
  line L6 (-590, 25) -> (0, 25) projected
  point P0 (-500, 0)
  dimension "d56" = 45
extrude "Extrusion4" cut sketch "Sketch9" against normal blind 109.75 contours L5 L2 L1
properties part number "P701" material "Aluminum 6061"
